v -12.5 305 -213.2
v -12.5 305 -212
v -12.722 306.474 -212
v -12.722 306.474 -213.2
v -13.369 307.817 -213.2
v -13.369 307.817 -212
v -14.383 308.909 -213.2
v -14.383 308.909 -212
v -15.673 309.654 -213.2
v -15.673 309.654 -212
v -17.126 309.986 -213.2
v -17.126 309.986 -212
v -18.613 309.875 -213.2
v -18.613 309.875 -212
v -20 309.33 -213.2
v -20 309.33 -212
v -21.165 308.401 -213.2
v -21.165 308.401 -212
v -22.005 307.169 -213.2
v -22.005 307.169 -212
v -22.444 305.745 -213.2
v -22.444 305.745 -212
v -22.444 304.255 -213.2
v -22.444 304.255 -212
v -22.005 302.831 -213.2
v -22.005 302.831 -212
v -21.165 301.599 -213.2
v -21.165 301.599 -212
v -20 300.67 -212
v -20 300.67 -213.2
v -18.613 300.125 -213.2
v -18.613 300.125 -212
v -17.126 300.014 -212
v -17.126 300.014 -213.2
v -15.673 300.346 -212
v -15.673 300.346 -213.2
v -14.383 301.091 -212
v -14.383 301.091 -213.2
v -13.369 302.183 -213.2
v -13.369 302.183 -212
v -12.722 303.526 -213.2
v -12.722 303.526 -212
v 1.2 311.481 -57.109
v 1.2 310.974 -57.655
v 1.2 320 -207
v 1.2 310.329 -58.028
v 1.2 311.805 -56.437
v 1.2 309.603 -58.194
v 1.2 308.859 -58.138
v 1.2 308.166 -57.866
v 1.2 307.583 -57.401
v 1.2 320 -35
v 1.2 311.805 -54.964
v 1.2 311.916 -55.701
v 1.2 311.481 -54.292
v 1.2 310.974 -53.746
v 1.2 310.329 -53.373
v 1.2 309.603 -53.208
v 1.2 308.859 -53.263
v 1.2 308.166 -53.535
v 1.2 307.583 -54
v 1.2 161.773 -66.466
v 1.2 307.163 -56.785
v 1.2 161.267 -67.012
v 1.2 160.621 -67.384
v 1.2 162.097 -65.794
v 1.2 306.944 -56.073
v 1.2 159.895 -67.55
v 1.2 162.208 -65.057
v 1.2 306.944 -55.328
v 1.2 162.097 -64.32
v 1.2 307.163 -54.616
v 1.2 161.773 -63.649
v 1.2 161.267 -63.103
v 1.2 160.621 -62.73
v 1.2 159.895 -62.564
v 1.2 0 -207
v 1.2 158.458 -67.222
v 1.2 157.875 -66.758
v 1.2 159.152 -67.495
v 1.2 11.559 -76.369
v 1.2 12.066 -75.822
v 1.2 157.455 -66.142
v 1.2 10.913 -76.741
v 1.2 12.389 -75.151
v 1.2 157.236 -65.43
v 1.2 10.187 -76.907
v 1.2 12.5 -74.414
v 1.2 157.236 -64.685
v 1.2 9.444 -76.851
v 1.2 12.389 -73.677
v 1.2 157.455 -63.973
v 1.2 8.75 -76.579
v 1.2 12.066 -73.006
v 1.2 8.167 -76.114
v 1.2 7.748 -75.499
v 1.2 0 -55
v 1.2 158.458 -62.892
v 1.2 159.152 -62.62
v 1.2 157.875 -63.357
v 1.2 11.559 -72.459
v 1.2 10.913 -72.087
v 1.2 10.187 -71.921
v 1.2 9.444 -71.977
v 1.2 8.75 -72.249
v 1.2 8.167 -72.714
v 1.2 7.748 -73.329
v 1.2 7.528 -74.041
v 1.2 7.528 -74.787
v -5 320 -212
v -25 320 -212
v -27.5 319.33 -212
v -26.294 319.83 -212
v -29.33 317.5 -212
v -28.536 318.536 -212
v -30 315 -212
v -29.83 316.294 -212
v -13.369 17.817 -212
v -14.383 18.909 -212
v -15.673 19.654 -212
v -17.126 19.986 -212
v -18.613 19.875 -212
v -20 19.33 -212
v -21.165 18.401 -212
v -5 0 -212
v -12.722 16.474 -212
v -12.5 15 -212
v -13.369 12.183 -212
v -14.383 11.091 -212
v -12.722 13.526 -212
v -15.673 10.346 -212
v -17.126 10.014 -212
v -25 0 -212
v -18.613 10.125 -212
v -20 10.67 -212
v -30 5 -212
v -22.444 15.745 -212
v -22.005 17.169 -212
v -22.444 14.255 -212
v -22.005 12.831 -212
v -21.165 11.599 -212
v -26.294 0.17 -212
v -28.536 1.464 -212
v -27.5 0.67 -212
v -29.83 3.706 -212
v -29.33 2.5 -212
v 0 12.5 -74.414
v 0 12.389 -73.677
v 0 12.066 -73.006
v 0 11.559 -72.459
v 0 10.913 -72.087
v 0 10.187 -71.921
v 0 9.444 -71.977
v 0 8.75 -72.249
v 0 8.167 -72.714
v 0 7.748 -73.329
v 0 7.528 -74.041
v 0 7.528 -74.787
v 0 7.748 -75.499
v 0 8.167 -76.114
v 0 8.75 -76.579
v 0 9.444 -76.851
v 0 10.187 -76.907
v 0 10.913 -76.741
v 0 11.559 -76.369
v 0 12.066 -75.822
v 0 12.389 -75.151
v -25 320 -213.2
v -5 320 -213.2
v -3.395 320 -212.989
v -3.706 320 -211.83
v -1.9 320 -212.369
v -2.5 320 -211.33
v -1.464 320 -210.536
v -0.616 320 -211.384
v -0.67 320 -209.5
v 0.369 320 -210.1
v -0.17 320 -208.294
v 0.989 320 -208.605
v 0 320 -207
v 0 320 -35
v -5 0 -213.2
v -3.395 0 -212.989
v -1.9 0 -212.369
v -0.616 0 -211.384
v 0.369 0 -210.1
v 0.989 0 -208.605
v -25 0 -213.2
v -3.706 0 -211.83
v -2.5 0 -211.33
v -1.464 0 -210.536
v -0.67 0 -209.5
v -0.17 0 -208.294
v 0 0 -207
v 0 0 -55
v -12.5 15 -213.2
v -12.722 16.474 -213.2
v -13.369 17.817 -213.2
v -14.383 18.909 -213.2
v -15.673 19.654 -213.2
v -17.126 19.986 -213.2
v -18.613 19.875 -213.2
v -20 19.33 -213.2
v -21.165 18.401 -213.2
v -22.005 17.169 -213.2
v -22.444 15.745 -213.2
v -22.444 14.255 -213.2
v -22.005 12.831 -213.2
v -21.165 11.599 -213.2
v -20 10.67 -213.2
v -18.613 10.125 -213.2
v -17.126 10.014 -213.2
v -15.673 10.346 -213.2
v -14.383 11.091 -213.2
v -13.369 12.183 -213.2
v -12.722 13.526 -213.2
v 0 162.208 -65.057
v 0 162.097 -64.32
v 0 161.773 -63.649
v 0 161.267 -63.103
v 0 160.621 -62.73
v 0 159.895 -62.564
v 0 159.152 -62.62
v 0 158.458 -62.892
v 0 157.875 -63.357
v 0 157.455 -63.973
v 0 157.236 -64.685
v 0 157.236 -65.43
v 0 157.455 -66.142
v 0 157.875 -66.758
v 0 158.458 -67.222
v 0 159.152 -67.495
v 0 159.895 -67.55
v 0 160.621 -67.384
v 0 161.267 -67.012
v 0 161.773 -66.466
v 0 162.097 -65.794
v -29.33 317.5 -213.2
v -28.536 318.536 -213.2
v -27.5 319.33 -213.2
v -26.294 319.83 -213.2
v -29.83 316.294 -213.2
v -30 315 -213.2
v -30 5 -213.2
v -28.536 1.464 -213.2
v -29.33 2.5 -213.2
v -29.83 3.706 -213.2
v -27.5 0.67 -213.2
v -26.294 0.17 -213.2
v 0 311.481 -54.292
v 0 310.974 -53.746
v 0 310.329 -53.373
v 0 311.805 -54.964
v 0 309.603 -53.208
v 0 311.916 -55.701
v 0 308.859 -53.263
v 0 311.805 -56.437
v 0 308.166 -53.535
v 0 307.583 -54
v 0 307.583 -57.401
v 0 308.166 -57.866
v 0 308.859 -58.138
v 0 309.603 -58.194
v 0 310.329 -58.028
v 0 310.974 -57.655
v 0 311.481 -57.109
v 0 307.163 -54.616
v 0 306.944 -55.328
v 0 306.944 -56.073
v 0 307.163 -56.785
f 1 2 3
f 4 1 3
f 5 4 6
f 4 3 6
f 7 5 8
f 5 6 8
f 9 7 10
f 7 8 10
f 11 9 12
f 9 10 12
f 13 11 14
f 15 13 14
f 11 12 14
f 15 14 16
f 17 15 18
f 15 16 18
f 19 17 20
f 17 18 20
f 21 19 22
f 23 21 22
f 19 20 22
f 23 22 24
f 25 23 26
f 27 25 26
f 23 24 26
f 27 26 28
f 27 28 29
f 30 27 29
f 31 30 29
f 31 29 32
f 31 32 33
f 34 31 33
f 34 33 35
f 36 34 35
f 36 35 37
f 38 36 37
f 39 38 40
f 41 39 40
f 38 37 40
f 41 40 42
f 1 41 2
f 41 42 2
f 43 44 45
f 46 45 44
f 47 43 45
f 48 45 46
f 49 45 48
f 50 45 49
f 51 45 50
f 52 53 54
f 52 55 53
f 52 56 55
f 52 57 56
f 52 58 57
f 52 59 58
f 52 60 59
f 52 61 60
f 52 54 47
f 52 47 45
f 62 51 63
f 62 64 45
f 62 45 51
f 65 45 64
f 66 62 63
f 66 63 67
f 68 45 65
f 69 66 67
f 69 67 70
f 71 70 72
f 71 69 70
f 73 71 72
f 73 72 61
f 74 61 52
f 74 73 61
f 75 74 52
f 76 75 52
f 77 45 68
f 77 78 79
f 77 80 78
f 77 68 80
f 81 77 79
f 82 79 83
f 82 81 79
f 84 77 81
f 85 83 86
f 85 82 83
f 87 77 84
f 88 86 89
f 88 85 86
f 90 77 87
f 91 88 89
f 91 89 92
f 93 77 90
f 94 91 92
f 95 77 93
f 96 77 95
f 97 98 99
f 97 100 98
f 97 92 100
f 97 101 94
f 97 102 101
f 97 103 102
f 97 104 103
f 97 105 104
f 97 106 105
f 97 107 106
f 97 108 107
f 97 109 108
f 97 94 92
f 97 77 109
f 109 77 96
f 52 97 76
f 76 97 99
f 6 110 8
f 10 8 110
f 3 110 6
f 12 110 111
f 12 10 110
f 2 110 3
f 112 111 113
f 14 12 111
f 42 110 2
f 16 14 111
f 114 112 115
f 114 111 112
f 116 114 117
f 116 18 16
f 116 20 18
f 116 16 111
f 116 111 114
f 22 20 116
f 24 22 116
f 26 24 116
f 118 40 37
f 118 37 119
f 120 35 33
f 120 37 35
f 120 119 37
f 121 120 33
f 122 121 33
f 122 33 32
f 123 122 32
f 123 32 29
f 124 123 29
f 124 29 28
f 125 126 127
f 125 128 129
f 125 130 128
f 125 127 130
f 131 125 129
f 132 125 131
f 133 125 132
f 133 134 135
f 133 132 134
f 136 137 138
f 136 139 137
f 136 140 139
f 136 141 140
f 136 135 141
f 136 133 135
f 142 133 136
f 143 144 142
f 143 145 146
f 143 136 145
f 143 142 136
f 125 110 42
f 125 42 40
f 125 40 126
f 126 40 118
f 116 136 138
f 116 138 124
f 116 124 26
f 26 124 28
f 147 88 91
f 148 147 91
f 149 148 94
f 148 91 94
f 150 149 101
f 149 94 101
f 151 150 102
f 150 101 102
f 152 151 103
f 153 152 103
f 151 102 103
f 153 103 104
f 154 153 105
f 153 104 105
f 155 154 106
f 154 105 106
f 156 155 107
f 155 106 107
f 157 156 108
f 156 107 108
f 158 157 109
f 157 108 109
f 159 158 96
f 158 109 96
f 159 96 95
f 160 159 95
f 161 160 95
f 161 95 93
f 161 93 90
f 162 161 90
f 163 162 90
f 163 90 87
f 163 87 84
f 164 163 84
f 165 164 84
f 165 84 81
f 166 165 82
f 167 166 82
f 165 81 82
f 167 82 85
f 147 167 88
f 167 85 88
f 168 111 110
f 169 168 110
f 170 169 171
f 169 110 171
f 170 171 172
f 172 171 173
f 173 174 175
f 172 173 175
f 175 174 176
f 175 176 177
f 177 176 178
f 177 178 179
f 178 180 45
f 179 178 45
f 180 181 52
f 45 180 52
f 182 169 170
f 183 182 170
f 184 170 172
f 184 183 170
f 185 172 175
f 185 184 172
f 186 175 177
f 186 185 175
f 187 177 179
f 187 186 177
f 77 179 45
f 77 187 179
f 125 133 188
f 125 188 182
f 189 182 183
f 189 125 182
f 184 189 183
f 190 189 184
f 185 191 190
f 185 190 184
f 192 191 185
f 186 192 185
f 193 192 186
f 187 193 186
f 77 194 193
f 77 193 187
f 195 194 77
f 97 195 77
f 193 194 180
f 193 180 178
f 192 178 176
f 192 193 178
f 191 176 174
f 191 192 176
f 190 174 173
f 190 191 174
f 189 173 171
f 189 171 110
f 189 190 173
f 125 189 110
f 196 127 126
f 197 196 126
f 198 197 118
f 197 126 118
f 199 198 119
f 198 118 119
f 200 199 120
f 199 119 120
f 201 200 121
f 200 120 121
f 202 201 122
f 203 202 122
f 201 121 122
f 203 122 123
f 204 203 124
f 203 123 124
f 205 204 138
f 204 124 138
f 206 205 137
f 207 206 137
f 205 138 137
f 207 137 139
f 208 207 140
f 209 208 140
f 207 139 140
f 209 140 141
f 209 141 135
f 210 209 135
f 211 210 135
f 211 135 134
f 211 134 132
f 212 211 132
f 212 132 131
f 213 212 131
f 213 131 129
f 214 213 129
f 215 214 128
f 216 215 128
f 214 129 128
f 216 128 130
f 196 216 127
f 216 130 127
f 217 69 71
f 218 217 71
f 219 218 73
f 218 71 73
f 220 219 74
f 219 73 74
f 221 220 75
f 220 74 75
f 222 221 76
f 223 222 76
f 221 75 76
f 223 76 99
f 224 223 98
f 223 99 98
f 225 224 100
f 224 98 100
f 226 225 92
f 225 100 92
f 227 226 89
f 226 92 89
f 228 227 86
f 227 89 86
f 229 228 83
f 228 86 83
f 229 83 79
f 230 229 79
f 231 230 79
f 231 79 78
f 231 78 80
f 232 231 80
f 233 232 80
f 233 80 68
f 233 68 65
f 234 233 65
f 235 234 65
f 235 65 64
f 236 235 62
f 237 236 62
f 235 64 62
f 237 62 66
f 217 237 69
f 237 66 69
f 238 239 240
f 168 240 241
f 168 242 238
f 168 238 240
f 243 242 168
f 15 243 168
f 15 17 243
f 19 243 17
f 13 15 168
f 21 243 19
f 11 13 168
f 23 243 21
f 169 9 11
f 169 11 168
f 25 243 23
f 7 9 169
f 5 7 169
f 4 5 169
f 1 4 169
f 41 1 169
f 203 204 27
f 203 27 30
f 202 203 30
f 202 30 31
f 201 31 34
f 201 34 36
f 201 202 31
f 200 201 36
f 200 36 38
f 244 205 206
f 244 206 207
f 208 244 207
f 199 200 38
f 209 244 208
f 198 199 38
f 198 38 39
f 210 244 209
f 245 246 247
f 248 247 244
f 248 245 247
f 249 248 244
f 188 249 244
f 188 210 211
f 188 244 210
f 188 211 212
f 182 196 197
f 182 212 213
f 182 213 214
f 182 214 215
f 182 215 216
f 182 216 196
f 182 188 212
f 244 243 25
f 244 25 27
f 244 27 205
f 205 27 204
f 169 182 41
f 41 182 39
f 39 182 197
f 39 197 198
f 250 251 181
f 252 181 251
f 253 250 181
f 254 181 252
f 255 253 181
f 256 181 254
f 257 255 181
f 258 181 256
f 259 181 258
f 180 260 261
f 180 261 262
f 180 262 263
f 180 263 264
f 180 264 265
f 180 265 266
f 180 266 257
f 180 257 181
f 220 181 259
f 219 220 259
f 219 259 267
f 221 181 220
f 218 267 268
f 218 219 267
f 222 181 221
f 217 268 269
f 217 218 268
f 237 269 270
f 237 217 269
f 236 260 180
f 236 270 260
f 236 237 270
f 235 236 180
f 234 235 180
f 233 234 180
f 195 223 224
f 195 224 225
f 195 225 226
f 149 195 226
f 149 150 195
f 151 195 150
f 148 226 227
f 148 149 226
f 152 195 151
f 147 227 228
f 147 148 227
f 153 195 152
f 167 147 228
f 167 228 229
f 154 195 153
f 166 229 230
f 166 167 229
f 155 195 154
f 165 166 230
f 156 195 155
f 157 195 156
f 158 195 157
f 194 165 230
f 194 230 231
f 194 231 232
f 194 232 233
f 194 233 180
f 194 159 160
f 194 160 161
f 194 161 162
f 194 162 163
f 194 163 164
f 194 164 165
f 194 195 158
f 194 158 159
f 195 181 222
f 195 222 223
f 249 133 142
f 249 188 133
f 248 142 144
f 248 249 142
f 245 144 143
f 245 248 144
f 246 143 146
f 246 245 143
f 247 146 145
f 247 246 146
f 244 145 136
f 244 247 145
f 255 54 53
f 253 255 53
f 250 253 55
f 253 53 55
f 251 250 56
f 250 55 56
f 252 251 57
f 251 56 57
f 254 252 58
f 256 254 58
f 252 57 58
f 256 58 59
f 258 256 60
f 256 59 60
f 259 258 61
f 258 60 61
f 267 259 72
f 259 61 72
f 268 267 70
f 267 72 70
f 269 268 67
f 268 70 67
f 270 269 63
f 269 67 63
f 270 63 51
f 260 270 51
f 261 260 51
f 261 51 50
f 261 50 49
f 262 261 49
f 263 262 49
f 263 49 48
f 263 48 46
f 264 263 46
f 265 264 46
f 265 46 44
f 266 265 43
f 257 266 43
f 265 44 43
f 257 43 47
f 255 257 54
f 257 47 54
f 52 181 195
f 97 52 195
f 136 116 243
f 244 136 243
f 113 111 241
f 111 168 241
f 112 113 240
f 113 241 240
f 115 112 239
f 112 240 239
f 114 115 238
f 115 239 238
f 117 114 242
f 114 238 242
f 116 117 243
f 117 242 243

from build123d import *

# Parameters (mm, degrees)
F1_DEPTH = 320
F2_R     = 5
F3_DEPTH = 1.2
F4_R     = 5
F6_DEPTH = 1.2
F7_R     = 2.5
F8_DEPTH = 1.2


with BuildPart() as f1:
    # F0 (on Front) → F1 (new body)
    with BuildSketch(Plane.XZ):
        with BuildLine():
            Line((1.2, 0), (0, 0))
            Line((0, 0), (0, -207))
            ThreePointArc((0, -207), (-1.464466, -210.535534), (-5, -212))
            Line((-5, -212), (-30, -212))
            Line((-30, -212), (-30, -213.2))
            Line((-30, -213.2), (-5, -213.2))
            ThreePointArc((-5, -213.2), (-0.615938, -211.384062), (1.2, -207))
            Line((1.2, -207), (1.2, 0))
        make_face()
    extrude(amount=-F1_DEPTH)

    # F2 (on face) → F3 (cut, through all)
    with BuildSketch(Plane.XY.offset(-212)):
        with Locations((-17.5, 305)):
            Circle(F2_R)
        with Locations((-17.5, 15)):
            Circle(F2_R)
    extrude(amount=-F3_DEPTH, mode=Mode.SUBTRACT)

    # F4
    f4_edges = [f1.edges().sort_by_distance(p)[0] for p in [
        (-30, 320, -212.6),
        (-30, 0, -212.6),
    ]]
    fillet(f4_edges, radius=F4_R)

    # F5 (on face) → F6 (cut, through all)
    with BuildSketch(Plane(origin=(0, 0, 0), x_dir=(0, -1, 0), z_dir=(-1, 0, 0))):
        Polygon((0, 0), (-320, 0), (-320, -35), (0, -55), align=None)
    extrude(amount=-F6_DEPTH, mode=Mode.SUBTRACT)

    # F7 (on face) → F8 (cut, through all)
    with BuildSketch(Plane.YZ.offset(1.2)):
        with Locations((10, -74.414024)):
            Circle(F7_R)
        with Locations((159.707887, -65.057282)):
            Circle(F7_R)
        with Locations((309.415774, -55.700539)):
            Circle(F7_R)
    extrude(amount=-F8_DEPTH, mode=Mode.SUBTRACT)


solid = f1.part
